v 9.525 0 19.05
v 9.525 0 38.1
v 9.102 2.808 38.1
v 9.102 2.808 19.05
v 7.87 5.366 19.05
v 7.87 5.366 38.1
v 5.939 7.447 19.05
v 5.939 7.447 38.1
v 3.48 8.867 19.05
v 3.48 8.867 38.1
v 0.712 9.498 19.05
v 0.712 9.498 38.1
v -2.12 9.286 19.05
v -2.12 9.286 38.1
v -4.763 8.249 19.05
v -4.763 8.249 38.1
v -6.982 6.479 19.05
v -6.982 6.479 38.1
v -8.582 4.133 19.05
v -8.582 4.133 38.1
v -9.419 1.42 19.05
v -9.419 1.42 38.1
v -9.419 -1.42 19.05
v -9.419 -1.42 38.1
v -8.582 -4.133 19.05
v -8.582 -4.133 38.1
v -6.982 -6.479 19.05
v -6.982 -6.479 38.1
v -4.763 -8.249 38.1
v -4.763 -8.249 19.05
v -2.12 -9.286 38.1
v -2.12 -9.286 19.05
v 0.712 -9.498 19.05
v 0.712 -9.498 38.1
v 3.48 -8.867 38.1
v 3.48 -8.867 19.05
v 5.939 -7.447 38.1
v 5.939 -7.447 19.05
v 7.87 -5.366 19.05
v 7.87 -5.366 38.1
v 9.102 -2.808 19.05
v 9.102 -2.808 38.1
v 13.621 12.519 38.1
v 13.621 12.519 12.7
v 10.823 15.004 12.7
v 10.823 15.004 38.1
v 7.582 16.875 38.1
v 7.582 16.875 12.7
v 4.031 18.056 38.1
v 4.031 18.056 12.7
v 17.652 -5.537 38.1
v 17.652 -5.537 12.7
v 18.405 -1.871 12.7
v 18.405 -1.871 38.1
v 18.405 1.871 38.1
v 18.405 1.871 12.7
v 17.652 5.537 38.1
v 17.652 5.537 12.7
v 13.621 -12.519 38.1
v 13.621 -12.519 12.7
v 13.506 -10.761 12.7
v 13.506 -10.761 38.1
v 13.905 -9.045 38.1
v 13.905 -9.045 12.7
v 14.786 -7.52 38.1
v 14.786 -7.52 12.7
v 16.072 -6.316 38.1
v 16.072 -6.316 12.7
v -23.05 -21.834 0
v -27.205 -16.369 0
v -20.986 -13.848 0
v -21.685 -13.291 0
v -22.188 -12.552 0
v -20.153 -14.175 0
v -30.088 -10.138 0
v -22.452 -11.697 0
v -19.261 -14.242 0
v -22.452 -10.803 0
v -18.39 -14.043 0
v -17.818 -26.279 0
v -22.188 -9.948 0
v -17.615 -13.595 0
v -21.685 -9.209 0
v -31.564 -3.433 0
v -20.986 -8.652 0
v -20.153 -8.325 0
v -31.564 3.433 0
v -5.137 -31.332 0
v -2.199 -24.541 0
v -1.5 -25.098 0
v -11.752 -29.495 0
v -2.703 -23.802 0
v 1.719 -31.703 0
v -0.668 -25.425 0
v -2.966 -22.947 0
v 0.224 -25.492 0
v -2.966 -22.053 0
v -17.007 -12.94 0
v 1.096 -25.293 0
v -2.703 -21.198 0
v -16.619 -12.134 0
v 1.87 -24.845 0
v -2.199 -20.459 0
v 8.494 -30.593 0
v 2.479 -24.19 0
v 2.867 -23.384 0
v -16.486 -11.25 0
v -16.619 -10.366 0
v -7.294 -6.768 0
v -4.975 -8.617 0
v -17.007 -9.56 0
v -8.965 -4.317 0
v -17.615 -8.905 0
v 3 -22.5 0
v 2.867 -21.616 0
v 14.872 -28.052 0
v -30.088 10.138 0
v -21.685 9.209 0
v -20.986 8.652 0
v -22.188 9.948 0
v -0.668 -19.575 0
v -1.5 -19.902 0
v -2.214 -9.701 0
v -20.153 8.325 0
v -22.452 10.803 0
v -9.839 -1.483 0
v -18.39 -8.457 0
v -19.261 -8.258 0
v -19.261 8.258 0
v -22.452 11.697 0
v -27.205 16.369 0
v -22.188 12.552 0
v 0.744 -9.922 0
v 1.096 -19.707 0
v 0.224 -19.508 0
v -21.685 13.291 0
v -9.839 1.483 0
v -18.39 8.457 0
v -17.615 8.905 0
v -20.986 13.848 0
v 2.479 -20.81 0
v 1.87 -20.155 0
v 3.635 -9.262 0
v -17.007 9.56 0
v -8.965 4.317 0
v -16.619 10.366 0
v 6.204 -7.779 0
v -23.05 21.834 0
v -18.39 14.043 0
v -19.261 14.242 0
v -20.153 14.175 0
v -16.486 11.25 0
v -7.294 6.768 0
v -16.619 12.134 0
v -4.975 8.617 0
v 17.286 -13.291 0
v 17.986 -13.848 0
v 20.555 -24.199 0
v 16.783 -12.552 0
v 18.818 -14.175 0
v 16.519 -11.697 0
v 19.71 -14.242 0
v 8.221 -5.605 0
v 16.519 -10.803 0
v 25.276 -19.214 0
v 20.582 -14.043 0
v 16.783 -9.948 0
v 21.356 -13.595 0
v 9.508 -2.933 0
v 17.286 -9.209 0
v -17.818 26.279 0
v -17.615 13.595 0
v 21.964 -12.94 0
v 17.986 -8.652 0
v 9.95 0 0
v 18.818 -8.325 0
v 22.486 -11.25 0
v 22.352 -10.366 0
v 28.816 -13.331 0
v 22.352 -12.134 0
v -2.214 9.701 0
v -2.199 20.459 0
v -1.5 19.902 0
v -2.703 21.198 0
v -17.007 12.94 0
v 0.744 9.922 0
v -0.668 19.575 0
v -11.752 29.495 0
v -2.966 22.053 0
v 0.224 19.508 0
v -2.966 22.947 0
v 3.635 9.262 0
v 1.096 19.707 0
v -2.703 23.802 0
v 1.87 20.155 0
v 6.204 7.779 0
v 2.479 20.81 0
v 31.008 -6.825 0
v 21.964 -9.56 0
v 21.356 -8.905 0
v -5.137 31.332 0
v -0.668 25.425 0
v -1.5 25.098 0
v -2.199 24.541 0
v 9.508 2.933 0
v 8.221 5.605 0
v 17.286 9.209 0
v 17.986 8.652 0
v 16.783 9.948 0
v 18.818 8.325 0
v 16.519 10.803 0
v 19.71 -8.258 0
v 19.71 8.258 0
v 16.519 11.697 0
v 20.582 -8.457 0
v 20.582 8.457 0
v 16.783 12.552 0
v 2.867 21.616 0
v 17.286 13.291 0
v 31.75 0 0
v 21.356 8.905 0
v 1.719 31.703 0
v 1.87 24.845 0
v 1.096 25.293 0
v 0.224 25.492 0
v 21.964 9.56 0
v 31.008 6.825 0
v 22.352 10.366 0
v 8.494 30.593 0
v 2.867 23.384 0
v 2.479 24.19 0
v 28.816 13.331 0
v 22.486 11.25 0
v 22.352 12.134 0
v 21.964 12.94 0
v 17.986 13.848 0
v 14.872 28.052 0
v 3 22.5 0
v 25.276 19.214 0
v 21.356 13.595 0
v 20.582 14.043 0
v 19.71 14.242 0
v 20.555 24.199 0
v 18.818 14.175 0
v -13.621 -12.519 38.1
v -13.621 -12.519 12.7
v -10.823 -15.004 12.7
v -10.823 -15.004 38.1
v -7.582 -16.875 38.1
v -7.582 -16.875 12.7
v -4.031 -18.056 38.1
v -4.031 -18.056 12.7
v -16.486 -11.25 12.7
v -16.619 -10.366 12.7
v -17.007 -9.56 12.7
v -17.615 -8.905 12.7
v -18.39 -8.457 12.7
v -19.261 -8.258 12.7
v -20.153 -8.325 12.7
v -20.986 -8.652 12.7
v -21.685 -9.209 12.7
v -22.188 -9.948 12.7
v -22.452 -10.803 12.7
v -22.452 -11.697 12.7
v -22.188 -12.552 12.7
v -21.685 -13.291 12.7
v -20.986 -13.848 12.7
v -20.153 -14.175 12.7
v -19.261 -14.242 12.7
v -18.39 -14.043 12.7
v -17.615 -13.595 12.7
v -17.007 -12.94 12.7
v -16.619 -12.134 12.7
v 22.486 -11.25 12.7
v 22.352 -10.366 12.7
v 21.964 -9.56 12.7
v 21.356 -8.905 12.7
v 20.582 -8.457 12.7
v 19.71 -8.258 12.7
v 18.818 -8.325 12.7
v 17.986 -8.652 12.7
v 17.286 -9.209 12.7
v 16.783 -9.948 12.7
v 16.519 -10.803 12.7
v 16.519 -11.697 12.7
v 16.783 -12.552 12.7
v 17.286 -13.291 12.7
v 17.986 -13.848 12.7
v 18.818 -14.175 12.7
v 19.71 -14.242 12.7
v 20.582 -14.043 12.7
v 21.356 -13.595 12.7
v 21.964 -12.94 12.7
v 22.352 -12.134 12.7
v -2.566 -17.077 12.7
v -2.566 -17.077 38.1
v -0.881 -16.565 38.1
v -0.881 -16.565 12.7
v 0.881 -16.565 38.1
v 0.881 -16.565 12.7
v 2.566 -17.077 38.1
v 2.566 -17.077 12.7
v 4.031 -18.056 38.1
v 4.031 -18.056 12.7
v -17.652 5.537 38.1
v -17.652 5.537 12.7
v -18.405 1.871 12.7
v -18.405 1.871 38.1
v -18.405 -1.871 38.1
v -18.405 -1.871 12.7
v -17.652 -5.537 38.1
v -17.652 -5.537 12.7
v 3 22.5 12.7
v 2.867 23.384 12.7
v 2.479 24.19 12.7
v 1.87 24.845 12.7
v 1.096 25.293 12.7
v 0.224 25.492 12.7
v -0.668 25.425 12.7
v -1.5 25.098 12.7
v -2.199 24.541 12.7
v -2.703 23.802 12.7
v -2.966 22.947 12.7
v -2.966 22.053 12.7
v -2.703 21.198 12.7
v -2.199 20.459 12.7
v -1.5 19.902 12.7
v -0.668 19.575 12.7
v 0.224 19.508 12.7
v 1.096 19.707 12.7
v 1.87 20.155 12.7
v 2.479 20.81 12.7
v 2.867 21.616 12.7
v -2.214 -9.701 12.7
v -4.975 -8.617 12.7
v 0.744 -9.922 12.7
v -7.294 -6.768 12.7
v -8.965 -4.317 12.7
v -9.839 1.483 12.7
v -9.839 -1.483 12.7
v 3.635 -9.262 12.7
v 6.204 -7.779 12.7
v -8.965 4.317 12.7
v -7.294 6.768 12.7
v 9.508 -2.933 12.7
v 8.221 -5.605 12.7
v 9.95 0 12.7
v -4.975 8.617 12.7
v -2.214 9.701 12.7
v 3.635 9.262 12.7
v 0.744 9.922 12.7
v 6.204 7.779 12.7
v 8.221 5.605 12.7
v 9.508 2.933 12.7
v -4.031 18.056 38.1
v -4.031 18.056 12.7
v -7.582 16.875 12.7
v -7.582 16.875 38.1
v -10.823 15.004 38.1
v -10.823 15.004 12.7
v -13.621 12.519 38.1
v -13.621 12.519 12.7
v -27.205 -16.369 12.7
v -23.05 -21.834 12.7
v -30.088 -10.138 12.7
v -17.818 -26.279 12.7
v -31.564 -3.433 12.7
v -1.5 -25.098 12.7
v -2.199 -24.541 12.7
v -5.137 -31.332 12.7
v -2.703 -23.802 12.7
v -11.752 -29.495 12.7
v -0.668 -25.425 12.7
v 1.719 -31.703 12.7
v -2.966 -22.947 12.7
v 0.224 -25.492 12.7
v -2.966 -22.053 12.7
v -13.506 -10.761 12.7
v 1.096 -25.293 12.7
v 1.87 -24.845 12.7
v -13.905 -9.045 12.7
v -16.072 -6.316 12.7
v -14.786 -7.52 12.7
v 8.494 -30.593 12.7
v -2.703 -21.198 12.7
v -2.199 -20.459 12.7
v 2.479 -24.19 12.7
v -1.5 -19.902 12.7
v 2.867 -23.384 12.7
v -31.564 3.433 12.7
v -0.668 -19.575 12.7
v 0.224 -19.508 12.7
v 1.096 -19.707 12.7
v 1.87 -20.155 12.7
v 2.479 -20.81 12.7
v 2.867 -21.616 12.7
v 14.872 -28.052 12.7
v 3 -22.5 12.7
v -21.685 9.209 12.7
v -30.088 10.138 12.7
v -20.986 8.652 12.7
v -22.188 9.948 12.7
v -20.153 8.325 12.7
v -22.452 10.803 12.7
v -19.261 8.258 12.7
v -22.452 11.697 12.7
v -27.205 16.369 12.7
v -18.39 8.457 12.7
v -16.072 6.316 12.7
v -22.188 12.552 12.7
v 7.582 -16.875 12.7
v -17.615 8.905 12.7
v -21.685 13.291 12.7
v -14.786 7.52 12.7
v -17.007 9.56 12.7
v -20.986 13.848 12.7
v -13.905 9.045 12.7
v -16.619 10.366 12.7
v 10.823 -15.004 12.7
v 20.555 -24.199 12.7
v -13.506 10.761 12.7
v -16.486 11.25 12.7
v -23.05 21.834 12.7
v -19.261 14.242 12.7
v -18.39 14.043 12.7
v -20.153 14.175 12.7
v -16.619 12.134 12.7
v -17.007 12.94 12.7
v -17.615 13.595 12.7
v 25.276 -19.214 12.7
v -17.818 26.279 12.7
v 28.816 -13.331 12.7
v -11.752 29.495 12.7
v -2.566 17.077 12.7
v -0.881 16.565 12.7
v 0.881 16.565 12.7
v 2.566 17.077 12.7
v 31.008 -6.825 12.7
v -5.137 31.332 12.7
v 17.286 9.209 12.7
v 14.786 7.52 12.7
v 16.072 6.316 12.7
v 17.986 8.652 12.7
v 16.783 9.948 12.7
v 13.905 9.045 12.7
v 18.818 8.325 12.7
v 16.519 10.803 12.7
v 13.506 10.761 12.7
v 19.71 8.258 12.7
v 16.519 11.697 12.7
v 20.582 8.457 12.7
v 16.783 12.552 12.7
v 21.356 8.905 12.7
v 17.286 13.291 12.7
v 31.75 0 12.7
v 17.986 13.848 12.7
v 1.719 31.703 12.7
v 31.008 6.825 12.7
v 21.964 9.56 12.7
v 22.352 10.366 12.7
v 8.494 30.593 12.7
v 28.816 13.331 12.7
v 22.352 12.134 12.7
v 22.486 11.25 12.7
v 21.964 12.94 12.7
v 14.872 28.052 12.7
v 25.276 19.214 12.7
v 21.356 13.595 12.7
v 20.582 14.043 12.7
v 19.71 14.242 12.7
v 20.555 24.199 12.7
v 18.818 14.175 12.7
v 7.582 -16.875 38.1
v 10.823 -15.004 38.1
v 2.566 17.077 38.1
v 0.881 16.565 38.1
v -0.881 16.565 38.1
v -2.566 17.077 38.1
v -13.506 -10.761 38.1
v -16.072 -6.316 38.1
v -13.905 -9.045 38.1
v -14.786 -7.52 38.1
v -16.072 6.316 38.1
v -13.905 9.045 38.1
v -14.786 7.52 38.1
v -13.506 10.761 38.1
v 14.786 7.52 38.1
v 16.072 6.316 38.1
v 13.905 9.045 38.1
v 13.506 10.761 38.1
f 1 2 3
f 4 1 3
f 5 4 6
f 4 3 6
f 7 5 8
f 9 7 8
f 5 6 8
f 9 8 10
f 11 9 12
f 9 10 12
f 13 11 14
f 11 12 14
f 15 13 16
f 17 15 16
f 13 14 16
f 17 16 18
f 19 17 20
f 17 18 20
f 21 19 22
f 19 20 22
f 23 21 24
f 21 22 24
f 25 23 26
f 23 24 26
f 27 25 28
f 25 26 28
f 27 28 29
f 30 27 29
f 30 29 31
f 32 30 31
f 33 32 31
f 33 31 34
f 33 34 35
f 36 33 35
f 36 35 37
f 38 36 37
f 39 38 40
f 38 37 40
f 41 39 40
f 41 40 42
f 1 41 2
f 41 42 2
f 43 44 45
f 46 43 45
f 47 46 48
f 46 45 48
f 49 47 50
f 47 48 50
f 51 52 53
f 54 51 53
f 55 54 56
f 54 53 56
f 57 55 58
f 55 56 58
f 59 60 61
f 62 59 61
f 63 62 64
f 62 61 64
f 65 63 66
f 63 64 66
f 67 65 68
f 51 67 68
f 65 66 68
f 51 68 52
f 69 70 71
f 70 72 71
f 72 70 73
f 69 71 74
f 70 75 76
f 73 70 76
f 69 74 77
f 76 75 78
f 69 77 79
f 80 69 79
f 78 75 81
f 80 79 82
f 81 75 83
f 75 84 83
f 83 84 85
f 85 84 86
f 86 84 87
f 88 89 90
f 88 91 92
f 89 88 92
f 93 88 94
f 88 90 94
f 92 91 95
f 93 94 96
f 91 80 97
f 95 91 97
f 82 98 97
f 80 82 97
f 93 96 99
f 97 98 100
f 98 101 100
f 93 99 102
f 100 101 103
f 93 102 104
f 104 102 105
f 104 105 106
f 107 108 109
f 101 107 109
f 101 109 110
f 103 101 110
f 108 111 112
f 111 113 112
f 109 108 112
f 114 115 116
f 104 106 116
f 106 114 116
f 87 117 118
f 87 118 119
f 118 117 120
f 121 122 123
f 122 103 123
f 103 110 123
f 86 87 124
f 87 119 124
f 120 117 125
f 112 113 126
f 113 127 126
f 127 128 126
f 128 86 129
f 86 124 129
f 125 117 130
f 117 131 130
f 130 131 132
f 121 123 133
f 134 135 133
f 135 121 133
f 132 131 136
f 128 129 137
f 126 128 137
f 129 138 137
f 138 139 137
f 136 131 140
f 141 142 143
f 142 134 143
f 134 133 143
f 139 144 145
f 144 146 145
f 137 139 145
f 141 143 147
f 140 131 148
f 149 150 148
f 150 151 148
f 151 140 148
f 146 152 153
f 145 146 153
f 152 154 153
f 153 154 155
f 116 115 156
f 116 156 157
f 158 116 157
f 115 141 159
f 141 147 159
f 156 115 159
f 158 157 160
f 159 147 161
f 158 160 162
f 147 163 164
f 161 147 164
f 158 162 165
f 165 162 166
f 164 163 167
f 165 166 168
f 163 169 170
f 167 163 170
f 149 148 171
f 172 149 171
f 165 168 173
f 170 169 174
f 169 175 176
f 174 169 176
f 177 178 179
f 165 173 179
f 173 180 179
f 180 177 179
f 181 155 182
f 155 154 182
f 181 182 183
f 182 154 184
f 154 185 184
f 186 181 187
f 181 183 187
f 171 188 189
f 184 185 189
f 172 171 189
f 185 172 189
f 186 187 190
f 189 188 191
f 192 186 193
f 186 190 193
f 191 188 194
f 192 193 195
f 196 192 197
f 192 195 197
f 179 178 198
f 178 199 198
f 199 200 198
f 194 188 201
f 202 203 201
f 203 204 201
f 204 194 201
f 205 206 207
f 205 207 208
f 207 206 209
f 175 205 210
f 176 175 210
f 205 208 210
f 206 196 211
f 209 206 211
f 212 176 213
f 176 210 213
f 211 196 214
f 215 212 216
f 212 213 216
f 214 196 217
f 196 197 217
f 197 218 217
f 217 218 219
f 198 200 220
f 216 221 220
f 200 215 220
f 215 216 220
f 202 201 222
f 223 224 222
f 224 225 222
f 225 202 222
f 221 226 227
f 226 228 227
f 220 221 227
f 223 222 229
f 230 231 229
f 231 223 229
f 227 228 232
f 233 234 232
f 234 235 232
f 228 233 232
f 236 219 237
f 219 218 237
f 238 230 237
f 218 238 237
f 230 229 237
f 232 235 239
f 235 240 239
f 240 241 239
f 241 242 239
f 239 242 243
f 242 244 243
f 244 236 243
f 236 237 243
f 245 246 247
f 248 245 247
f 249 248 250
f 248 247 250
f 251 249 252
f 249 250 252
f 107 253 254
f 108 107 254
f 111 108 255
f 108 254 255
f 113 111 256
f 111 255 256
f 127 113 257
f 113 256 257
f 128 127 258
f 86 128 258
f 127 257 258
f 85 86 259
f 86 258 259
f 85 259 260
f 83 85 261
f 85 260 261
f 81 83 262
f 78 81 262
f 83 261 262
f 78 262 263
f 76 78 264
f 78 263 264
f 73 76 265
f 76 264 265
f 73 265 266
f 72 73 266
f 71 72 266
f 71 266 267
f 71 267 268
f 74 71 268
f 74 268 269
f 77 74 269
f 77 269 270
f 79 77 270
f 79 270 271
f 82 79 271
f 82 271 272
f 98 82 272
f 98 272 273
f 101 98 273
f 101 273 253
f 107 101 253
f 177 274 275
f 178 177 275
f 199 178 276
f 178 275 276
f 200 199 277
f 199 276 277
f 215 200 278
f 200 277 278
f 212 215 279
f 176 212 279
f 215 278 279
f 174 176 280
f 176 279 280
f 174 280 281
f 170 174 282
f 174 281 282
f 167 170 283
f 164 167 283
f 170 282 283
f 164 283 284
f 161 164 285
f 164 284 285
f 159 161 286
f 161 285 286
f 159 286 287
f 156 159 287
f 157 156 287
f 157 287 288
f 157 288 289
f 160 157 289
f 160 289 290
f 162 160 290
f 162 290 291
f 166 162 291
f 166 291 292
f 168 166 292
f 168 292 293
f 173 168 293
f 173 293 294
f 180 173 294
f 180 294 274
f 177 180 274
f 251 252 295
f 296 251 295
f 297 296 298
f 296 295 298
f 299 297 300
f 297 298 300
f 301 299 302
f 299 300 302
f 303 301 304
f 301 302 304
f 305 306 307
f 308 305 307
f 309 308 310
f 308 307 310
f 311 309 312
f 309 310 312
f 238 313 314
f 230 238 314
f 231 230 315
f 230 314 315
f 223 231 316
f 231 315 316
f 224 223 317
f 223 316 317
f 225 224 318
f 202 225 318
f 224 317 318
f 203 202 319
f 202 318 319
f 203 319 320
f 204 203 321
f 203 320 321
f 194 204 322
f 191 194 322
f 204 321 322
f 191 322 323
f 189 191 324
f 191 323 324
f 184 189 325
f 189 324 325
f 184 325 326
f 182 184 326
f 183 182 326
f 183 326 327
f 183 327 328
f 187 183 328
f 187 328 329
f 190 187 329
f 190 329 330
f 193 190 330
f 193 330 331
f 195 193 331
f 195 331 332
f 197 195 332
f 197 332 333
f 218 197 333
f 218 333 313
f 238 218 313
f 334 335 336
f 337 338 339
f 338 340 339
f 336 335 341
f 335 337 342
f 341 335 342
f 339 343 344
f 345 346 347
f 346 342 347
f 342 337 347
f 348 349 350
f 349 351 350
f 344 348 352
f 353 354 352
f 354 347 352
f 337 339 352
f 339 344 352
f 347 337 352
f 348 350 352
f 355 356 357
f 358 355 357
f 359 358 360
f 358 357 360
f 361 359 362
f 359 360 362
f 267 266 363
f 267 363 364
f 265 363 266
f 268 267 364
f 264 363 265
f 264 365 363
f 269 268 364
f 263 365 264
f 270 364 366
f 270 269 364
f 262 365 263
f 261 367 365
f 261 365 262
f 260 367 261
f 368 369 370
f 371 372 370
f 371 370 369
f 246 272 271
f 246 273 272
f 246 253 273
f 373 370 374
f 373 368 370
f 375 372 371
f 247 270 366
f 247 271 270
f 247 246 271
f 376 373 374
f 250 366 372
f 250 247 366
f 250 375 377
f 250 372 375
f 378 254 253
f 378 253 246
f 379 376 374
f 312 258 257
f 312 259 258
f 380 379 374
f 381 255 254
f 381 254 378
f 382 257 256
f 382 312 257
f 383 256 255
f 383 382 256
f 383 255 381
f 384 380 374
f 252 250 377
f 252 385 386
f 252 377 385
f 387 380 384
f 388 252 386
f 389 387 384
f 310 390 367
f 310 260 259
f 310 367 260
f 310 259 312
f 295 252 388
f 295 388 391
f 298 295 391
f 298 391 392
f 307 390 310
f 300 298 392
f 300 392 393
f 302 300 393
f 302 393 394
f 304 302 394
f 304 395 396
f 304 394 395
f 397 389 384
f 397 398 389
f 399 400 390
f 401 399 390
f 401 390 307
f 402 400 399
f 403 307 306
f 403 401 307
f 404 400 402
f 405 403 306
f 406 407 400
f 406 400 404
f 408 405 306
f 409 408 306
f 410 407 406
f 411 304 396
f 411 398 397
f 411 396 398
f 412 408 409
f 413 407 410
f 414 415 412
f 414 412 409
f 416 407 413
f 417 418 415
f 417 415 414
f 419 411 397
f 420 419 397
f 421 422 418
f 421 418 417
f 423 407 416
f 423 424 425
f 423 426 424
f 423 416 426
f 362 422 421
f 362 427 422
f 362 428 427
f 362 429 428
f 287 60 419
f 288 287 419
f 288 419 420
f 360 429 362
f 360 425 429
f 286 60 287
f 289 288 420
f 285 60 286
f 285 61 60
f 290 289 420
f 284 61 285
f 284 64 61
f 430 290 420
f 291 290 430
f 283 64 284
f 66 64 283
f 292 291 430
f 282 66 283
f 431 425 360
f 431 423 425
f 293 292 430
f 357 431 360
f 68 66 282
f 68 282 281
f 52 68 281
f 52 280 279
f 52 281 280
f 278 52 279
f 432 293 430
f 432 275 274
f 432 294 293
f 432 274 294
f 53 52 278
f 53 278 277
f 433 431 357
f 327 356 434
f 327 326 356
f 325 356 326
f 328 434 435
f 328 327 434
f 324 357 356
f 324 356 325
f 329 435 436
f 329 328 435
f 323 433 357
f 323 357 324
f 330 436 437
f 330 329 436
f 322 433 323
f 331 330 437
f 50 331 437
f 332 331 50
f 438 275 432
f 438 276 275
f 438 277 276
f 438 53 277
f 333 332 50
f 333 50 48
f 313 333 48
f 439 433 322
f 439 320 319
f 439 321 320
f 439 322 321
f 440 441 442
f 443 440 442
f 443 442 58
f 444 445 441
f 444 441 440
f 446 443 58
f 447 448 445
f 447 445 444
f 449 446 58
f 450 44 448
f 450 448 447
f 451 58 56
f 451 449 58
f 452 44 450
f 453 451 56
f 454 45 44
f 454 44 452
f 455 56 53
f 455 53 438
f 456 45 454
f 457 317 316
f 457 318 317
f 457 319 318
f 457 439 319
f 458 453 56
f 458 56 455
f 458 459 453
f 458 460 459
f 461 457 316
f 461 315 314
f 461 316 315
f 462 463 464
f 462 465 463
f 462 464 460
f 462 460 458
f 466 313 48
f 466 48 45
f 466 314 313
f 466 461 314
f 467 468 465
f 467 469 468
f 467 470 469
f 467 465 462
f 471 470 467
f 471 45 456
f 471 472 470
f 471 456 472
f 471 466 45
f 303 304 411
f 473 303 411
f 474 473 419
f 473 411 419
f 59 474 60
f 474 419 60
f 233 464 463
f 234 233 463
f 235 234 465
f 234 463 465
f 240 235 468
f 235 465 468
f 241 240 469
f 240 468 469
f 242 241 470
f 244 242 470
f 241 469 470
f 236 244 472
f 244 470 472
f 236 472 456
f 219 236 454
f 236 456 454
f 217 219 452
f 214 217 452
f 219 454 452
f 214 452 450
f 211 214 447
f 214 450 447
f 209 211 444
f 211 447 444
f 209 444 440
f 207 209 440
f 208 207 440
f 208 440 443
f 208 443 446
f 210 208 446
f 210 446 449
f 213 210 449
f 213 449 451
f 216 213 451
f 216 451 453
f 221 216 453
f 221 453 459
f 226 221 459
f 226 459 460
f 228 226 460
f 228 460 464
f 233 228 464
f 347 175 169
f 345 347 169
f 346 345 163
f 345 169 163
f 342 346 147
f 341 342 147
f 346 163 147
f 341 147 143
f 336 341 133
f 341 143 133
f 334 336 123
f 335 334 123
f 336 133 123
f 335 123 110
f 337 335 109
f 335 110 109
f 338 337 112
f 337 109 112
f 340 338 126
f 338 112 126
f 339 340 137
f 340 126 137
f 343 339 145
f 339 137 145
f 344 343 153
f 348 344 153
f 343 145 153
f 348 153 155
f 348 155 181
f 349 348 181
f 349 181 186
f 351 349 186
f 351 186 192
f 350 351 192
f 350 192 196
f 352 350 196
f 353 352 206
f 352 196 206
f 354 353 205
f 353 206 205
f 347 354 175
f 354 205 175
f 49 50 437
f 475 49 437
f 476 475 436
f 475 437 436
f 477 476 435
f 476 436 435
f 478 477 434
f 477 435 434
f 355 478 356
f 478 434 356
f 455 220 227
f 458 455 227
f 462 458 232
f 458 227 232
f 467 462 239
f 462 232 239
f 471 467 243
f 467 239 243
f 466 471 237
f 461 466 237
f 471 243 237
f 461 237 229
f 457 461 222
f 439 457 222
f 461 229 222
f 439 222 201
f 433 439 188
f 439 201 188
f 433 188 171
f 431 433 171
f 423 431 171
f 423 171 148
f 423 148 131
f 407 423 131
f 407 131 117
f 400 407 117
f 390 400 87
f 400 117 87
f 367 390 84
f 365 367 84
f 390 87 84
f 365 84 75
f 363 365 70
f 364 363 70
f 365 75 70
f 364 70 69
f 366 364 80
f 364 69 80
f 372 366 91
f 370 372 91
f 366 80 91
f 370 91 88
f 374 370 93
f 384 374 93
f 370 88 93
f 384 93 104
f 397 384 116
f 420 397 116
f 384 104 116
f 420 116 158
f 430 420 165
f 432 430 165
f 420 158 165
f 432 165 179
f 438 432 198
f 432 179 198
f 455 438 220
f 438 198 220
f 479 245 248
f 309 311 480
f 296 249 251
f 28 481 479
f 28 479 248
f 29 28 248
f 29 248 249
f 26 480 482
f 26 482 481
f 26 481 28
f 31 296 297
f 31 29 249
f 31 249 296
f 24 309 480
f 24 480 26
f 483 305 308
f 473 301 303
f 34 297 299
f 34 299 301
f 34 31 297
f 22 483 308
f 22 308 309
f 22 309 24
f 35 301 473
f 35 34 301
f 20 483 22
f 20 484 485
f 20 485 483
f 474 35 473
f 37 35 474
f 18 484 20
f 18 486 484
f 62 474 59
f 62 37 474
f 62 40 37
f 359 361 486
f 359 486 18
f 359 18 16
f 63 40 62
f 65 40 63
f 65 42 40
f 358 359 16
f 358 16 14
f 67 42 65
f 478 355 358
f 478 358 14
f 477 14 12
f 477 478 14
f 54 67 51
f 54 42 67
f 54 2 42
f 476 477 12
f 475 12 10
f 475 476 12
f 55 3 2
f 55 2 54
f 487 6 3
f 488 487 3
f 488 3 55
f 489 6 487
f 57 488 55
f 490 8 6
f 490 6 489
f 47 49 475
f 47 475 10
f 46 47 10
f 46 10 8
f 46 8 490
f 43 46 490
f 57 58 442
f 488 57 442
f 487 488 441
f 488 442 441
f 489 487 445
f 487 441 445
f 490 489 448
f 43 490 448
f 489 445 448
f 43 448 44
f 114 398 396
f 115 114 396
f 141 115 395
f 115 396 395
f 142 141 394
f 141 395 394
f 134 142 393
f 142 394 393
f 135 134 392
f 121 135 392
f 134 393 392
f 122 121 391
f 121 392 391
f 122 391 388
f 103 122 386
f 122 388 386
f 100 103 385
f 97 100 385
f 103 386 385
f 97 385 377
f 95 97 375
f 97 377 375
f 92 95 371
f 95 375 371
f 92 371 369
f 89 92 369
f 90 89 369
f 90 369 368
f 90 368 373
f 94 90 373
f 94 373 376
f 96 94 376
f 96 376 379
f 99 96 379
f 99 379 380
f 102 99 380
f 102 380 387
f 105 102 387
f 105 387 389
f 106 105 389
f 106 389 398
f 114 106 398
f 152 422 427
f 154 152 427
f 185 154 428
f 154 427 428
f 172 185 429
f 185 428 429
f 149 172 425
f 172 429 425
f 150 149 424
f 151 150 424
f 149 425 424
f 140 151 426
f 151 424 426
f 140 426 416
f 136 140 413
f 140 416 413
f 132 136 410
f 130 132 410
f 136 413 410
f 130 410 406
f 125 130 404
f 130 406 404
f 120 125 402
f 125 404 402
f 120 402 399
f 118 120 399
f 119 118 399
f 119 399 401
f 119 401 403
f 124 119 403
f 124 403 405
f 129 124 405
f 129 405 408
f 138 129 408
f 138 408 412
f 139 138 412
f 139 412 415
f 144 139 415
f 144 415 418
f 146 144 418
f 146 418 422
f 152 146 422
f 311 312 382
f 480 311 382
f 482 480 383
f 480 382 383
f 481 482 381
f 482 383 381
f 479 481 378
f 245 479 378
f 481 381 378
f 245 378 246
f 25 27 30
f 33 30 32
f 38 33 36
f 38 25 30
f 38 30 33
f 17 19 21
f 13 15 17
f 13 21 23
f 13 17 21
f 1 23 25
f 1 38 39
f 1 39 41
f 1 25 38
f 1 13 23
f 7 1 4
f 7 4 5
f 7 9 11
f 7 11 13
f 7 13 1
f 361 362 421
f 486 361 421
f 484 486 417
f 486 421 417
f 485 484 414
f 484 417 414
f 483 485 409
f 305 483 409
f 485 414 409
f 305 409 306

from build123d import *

# Parameters (mm, degrees)
F0_R     = 31.75
F1_DEPTH = 12.7
F2_R     = 3
F3_DEPTH = 12.701
F4_R     = 9.95
F5_DEPTH = 12.7
F7_DEPTH = 25.4
F8_R     = 9.525
F9_DEPTH = 19.05


with BuildPart() as f1:
    # F0 (on Top) → F1 (new body)
    with BuildSketch(Plane.XY):
        Circle(F0_R)
    extrude(amount=F1_DEPTH)

    # F2 (on face) → F3 (cut, through all)
    with BuildSketch(Plane.XY.offset(12.7)):
        with Locations((0, 22.5)):
            Circle(F2_R)
        with Locations((-19.485572, 11.25)):
            Circle(F2_R)
        with Locations((-19.485572, -11.25)):
            Circle(F2_R)
        with Locations((0, -22.5)):
            Circle(F2_R)
        with Locations((19.485572, -11.25)):
            Circle(F2_R)
        with Locations((19.485572, 11.25)):
            Circle(F2_R)
    extrude(amount=-F3_DEPTH, mode=Mode.SUBTRACT)

    # F4 (on face) → F5 (cut)
    with BuildSketch(Plane(origin=(0, 0, 0), x_dir=(1, 0, 0), z_dir=(0, 0, -1))):
        Circle(F4_R)
    extrude(amount=-F5_DEPTH, mode=Mode.SUBTRACT)

    # F6 (on face) → F7 (join)
    with BuildSketch(Plane.XY.offset(12.7)):
        with BuildLine():
            ThreePointArc((-4.030746, -18.055556), (0, -16.5), (4.030746, -18.055556))
            ThreePointArc((4.030746, -18.055556), (9.25, -16.02147), (13.621197, -12.518506))
            ThreePointArc((13.621197, -12.518506), (14.289419, -8.25), (17.651943, -5.537049))
            ThreePointArc((17.651943, -5.537049), (18.5, 0), (17.651943, 5.537049))
            ThreePointArc((17.651943, 5.537049), (14.289419, 8.25), (13.621197, 12.518506))
            ThreePointArc((13.621197, 12.518506), (9.25, 16.02147), (4.030746, 18.055556))
            ThreePointArc((4.030746, 18.055556), (0, 16.5), (-4.030746, 18.055556))
            ThreePointArc((-4.030746, 18.055556), (-9.25, 16.02147), (-13.621197, 12.518506))
            ThreePointArc((-13.621197, 12.518506), (-14.289419, 8.25), (-17.651943, 5.537049))
            ThreePointArc((-17.651943, 5.537049), (-18.5, 0), (-17.651943, -5.537049))
            ThreePointArc((-17.651943, -5.537049), (-14.289419, -8.25), (-13.621197, -12.518506))
            ThreePointArc((-13.621197, -12.518506), (-9.25, -16.02147), (-4.030746, -18.055556))
        make_face()
    extrude(amount=F7_DEPTH)

    # F8 (on face) → F9 (cut)
    with BuildSketch(Plane.XY.offset(38.1)):
        Circle(F8_R)
    extrude(amount=-F9_DEPTH, mode=Mode.SUBTRACT)


solid = f1.part
